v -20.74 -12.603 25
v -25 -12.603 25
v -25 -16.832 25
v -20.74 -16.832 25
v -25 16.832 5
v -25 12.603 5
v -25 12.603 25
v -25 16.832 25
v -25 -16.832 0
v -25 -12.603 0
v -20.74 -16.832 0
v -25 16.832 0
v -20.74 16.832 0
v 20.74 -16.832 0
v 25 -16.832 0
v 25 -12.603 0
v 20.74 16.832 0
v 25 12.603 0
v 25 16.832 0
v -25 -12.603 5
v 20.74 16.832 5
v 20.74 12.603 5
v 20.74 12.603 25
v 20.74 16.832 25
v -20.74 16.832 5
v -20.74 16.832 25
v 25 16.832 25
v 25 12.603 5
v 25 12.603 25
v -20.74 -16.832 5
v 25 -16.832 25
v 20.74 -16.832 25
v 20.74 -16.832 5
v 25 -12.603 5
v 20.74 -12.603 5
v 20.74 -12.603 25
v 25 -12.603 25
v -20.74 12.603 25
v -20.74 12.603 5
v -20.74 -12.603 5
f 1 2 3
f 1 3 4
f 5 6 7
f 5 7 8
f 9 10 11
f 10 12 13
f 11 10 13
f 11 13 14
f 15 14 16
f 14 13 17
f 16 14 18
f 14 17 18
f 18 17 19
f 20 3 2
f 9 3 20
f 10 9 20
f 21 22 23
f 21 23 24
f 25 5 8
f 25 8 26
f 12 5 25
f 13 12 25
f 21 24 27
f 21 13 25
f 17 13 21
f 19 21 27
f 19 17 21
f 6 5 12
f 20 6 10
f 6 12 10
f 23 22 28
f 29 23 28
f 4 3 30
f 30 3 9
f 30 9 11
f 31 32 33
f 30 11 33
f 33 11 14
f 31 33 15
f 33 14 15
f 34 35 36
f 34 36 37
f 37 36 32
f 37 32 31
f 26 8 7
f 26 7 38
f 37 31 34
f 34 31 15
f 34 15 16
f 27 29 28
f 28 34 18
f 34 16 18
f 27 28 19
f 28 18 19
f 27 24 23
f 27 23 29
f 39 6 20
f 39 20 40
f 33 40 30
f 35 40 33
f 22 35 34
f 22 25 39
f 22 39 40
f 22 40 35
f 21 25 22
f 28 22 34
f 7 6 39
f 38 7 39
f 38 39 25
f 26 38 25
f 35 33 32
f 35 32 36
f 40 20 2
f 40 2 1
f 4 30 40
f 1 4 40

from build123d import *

# Parameters (mm, degrees)
F0_W     = 4.2595966585
F0_H     = 4.2287140257
F1_DEPTH = 5
F2_DEPTH = 25


with BuildPart() as f1:
    # F0 (on Top) → F1 (new body)
    with BuildSketch(Plane.XY):
        with Locations((-22.8702016707, 14.7173251896)):
            Rectangle(F0_W, F0_H)
        Polygon((20.7404033415, 16.8316822024), (-20.7404033415, 16.8316822024), (-20.7404033415, 12.6029681767), (-25, 12.6029681767), (-25, -12.6029681767), (-20.7404033415, -12.6029681767), (-20.7404033415, -16.8316822024), (20.7404033415, -16.8316822024), (20.7404033415, -12.6029681767), (25, -12.6029681767), (25, 12.6029681767), (20.7404033415, 12.6029681767), align=None)
        with Locations((22.8702016707, 14.7173251896)):
            Rectangle(F0_W, F0_H)
        with Locations((-22.8702016707, -14.7173251896)):
            Rectangle(F0_W, F0_H)
        with Locations((22.8702016707, -14.7173251896)):
            Rectangle(F0_W, F0_H)
    extrude(amount=F1_DEPTH)

    # F0 (on Top) → F2 (join)
    with BuildSketch(Plane.XY):
        with Locations((22.8702016707, 14.7173251896)):
            Rectangle(F0_W, F0_H)
        with Locations((22.8702016707, -14.7173251896)):
            Rectangle(F0_W, F0_H)
        with Locations((-22.8702016707, -14.7173251896)):
            Rectangle(F0_W, F0_H)
        with Locations((-22.8702016707, 14.7173251896)):
            Rectangle(F0_W, F0_H)
    extrude(amount=F2_DEPTH)


solid = f1.part
